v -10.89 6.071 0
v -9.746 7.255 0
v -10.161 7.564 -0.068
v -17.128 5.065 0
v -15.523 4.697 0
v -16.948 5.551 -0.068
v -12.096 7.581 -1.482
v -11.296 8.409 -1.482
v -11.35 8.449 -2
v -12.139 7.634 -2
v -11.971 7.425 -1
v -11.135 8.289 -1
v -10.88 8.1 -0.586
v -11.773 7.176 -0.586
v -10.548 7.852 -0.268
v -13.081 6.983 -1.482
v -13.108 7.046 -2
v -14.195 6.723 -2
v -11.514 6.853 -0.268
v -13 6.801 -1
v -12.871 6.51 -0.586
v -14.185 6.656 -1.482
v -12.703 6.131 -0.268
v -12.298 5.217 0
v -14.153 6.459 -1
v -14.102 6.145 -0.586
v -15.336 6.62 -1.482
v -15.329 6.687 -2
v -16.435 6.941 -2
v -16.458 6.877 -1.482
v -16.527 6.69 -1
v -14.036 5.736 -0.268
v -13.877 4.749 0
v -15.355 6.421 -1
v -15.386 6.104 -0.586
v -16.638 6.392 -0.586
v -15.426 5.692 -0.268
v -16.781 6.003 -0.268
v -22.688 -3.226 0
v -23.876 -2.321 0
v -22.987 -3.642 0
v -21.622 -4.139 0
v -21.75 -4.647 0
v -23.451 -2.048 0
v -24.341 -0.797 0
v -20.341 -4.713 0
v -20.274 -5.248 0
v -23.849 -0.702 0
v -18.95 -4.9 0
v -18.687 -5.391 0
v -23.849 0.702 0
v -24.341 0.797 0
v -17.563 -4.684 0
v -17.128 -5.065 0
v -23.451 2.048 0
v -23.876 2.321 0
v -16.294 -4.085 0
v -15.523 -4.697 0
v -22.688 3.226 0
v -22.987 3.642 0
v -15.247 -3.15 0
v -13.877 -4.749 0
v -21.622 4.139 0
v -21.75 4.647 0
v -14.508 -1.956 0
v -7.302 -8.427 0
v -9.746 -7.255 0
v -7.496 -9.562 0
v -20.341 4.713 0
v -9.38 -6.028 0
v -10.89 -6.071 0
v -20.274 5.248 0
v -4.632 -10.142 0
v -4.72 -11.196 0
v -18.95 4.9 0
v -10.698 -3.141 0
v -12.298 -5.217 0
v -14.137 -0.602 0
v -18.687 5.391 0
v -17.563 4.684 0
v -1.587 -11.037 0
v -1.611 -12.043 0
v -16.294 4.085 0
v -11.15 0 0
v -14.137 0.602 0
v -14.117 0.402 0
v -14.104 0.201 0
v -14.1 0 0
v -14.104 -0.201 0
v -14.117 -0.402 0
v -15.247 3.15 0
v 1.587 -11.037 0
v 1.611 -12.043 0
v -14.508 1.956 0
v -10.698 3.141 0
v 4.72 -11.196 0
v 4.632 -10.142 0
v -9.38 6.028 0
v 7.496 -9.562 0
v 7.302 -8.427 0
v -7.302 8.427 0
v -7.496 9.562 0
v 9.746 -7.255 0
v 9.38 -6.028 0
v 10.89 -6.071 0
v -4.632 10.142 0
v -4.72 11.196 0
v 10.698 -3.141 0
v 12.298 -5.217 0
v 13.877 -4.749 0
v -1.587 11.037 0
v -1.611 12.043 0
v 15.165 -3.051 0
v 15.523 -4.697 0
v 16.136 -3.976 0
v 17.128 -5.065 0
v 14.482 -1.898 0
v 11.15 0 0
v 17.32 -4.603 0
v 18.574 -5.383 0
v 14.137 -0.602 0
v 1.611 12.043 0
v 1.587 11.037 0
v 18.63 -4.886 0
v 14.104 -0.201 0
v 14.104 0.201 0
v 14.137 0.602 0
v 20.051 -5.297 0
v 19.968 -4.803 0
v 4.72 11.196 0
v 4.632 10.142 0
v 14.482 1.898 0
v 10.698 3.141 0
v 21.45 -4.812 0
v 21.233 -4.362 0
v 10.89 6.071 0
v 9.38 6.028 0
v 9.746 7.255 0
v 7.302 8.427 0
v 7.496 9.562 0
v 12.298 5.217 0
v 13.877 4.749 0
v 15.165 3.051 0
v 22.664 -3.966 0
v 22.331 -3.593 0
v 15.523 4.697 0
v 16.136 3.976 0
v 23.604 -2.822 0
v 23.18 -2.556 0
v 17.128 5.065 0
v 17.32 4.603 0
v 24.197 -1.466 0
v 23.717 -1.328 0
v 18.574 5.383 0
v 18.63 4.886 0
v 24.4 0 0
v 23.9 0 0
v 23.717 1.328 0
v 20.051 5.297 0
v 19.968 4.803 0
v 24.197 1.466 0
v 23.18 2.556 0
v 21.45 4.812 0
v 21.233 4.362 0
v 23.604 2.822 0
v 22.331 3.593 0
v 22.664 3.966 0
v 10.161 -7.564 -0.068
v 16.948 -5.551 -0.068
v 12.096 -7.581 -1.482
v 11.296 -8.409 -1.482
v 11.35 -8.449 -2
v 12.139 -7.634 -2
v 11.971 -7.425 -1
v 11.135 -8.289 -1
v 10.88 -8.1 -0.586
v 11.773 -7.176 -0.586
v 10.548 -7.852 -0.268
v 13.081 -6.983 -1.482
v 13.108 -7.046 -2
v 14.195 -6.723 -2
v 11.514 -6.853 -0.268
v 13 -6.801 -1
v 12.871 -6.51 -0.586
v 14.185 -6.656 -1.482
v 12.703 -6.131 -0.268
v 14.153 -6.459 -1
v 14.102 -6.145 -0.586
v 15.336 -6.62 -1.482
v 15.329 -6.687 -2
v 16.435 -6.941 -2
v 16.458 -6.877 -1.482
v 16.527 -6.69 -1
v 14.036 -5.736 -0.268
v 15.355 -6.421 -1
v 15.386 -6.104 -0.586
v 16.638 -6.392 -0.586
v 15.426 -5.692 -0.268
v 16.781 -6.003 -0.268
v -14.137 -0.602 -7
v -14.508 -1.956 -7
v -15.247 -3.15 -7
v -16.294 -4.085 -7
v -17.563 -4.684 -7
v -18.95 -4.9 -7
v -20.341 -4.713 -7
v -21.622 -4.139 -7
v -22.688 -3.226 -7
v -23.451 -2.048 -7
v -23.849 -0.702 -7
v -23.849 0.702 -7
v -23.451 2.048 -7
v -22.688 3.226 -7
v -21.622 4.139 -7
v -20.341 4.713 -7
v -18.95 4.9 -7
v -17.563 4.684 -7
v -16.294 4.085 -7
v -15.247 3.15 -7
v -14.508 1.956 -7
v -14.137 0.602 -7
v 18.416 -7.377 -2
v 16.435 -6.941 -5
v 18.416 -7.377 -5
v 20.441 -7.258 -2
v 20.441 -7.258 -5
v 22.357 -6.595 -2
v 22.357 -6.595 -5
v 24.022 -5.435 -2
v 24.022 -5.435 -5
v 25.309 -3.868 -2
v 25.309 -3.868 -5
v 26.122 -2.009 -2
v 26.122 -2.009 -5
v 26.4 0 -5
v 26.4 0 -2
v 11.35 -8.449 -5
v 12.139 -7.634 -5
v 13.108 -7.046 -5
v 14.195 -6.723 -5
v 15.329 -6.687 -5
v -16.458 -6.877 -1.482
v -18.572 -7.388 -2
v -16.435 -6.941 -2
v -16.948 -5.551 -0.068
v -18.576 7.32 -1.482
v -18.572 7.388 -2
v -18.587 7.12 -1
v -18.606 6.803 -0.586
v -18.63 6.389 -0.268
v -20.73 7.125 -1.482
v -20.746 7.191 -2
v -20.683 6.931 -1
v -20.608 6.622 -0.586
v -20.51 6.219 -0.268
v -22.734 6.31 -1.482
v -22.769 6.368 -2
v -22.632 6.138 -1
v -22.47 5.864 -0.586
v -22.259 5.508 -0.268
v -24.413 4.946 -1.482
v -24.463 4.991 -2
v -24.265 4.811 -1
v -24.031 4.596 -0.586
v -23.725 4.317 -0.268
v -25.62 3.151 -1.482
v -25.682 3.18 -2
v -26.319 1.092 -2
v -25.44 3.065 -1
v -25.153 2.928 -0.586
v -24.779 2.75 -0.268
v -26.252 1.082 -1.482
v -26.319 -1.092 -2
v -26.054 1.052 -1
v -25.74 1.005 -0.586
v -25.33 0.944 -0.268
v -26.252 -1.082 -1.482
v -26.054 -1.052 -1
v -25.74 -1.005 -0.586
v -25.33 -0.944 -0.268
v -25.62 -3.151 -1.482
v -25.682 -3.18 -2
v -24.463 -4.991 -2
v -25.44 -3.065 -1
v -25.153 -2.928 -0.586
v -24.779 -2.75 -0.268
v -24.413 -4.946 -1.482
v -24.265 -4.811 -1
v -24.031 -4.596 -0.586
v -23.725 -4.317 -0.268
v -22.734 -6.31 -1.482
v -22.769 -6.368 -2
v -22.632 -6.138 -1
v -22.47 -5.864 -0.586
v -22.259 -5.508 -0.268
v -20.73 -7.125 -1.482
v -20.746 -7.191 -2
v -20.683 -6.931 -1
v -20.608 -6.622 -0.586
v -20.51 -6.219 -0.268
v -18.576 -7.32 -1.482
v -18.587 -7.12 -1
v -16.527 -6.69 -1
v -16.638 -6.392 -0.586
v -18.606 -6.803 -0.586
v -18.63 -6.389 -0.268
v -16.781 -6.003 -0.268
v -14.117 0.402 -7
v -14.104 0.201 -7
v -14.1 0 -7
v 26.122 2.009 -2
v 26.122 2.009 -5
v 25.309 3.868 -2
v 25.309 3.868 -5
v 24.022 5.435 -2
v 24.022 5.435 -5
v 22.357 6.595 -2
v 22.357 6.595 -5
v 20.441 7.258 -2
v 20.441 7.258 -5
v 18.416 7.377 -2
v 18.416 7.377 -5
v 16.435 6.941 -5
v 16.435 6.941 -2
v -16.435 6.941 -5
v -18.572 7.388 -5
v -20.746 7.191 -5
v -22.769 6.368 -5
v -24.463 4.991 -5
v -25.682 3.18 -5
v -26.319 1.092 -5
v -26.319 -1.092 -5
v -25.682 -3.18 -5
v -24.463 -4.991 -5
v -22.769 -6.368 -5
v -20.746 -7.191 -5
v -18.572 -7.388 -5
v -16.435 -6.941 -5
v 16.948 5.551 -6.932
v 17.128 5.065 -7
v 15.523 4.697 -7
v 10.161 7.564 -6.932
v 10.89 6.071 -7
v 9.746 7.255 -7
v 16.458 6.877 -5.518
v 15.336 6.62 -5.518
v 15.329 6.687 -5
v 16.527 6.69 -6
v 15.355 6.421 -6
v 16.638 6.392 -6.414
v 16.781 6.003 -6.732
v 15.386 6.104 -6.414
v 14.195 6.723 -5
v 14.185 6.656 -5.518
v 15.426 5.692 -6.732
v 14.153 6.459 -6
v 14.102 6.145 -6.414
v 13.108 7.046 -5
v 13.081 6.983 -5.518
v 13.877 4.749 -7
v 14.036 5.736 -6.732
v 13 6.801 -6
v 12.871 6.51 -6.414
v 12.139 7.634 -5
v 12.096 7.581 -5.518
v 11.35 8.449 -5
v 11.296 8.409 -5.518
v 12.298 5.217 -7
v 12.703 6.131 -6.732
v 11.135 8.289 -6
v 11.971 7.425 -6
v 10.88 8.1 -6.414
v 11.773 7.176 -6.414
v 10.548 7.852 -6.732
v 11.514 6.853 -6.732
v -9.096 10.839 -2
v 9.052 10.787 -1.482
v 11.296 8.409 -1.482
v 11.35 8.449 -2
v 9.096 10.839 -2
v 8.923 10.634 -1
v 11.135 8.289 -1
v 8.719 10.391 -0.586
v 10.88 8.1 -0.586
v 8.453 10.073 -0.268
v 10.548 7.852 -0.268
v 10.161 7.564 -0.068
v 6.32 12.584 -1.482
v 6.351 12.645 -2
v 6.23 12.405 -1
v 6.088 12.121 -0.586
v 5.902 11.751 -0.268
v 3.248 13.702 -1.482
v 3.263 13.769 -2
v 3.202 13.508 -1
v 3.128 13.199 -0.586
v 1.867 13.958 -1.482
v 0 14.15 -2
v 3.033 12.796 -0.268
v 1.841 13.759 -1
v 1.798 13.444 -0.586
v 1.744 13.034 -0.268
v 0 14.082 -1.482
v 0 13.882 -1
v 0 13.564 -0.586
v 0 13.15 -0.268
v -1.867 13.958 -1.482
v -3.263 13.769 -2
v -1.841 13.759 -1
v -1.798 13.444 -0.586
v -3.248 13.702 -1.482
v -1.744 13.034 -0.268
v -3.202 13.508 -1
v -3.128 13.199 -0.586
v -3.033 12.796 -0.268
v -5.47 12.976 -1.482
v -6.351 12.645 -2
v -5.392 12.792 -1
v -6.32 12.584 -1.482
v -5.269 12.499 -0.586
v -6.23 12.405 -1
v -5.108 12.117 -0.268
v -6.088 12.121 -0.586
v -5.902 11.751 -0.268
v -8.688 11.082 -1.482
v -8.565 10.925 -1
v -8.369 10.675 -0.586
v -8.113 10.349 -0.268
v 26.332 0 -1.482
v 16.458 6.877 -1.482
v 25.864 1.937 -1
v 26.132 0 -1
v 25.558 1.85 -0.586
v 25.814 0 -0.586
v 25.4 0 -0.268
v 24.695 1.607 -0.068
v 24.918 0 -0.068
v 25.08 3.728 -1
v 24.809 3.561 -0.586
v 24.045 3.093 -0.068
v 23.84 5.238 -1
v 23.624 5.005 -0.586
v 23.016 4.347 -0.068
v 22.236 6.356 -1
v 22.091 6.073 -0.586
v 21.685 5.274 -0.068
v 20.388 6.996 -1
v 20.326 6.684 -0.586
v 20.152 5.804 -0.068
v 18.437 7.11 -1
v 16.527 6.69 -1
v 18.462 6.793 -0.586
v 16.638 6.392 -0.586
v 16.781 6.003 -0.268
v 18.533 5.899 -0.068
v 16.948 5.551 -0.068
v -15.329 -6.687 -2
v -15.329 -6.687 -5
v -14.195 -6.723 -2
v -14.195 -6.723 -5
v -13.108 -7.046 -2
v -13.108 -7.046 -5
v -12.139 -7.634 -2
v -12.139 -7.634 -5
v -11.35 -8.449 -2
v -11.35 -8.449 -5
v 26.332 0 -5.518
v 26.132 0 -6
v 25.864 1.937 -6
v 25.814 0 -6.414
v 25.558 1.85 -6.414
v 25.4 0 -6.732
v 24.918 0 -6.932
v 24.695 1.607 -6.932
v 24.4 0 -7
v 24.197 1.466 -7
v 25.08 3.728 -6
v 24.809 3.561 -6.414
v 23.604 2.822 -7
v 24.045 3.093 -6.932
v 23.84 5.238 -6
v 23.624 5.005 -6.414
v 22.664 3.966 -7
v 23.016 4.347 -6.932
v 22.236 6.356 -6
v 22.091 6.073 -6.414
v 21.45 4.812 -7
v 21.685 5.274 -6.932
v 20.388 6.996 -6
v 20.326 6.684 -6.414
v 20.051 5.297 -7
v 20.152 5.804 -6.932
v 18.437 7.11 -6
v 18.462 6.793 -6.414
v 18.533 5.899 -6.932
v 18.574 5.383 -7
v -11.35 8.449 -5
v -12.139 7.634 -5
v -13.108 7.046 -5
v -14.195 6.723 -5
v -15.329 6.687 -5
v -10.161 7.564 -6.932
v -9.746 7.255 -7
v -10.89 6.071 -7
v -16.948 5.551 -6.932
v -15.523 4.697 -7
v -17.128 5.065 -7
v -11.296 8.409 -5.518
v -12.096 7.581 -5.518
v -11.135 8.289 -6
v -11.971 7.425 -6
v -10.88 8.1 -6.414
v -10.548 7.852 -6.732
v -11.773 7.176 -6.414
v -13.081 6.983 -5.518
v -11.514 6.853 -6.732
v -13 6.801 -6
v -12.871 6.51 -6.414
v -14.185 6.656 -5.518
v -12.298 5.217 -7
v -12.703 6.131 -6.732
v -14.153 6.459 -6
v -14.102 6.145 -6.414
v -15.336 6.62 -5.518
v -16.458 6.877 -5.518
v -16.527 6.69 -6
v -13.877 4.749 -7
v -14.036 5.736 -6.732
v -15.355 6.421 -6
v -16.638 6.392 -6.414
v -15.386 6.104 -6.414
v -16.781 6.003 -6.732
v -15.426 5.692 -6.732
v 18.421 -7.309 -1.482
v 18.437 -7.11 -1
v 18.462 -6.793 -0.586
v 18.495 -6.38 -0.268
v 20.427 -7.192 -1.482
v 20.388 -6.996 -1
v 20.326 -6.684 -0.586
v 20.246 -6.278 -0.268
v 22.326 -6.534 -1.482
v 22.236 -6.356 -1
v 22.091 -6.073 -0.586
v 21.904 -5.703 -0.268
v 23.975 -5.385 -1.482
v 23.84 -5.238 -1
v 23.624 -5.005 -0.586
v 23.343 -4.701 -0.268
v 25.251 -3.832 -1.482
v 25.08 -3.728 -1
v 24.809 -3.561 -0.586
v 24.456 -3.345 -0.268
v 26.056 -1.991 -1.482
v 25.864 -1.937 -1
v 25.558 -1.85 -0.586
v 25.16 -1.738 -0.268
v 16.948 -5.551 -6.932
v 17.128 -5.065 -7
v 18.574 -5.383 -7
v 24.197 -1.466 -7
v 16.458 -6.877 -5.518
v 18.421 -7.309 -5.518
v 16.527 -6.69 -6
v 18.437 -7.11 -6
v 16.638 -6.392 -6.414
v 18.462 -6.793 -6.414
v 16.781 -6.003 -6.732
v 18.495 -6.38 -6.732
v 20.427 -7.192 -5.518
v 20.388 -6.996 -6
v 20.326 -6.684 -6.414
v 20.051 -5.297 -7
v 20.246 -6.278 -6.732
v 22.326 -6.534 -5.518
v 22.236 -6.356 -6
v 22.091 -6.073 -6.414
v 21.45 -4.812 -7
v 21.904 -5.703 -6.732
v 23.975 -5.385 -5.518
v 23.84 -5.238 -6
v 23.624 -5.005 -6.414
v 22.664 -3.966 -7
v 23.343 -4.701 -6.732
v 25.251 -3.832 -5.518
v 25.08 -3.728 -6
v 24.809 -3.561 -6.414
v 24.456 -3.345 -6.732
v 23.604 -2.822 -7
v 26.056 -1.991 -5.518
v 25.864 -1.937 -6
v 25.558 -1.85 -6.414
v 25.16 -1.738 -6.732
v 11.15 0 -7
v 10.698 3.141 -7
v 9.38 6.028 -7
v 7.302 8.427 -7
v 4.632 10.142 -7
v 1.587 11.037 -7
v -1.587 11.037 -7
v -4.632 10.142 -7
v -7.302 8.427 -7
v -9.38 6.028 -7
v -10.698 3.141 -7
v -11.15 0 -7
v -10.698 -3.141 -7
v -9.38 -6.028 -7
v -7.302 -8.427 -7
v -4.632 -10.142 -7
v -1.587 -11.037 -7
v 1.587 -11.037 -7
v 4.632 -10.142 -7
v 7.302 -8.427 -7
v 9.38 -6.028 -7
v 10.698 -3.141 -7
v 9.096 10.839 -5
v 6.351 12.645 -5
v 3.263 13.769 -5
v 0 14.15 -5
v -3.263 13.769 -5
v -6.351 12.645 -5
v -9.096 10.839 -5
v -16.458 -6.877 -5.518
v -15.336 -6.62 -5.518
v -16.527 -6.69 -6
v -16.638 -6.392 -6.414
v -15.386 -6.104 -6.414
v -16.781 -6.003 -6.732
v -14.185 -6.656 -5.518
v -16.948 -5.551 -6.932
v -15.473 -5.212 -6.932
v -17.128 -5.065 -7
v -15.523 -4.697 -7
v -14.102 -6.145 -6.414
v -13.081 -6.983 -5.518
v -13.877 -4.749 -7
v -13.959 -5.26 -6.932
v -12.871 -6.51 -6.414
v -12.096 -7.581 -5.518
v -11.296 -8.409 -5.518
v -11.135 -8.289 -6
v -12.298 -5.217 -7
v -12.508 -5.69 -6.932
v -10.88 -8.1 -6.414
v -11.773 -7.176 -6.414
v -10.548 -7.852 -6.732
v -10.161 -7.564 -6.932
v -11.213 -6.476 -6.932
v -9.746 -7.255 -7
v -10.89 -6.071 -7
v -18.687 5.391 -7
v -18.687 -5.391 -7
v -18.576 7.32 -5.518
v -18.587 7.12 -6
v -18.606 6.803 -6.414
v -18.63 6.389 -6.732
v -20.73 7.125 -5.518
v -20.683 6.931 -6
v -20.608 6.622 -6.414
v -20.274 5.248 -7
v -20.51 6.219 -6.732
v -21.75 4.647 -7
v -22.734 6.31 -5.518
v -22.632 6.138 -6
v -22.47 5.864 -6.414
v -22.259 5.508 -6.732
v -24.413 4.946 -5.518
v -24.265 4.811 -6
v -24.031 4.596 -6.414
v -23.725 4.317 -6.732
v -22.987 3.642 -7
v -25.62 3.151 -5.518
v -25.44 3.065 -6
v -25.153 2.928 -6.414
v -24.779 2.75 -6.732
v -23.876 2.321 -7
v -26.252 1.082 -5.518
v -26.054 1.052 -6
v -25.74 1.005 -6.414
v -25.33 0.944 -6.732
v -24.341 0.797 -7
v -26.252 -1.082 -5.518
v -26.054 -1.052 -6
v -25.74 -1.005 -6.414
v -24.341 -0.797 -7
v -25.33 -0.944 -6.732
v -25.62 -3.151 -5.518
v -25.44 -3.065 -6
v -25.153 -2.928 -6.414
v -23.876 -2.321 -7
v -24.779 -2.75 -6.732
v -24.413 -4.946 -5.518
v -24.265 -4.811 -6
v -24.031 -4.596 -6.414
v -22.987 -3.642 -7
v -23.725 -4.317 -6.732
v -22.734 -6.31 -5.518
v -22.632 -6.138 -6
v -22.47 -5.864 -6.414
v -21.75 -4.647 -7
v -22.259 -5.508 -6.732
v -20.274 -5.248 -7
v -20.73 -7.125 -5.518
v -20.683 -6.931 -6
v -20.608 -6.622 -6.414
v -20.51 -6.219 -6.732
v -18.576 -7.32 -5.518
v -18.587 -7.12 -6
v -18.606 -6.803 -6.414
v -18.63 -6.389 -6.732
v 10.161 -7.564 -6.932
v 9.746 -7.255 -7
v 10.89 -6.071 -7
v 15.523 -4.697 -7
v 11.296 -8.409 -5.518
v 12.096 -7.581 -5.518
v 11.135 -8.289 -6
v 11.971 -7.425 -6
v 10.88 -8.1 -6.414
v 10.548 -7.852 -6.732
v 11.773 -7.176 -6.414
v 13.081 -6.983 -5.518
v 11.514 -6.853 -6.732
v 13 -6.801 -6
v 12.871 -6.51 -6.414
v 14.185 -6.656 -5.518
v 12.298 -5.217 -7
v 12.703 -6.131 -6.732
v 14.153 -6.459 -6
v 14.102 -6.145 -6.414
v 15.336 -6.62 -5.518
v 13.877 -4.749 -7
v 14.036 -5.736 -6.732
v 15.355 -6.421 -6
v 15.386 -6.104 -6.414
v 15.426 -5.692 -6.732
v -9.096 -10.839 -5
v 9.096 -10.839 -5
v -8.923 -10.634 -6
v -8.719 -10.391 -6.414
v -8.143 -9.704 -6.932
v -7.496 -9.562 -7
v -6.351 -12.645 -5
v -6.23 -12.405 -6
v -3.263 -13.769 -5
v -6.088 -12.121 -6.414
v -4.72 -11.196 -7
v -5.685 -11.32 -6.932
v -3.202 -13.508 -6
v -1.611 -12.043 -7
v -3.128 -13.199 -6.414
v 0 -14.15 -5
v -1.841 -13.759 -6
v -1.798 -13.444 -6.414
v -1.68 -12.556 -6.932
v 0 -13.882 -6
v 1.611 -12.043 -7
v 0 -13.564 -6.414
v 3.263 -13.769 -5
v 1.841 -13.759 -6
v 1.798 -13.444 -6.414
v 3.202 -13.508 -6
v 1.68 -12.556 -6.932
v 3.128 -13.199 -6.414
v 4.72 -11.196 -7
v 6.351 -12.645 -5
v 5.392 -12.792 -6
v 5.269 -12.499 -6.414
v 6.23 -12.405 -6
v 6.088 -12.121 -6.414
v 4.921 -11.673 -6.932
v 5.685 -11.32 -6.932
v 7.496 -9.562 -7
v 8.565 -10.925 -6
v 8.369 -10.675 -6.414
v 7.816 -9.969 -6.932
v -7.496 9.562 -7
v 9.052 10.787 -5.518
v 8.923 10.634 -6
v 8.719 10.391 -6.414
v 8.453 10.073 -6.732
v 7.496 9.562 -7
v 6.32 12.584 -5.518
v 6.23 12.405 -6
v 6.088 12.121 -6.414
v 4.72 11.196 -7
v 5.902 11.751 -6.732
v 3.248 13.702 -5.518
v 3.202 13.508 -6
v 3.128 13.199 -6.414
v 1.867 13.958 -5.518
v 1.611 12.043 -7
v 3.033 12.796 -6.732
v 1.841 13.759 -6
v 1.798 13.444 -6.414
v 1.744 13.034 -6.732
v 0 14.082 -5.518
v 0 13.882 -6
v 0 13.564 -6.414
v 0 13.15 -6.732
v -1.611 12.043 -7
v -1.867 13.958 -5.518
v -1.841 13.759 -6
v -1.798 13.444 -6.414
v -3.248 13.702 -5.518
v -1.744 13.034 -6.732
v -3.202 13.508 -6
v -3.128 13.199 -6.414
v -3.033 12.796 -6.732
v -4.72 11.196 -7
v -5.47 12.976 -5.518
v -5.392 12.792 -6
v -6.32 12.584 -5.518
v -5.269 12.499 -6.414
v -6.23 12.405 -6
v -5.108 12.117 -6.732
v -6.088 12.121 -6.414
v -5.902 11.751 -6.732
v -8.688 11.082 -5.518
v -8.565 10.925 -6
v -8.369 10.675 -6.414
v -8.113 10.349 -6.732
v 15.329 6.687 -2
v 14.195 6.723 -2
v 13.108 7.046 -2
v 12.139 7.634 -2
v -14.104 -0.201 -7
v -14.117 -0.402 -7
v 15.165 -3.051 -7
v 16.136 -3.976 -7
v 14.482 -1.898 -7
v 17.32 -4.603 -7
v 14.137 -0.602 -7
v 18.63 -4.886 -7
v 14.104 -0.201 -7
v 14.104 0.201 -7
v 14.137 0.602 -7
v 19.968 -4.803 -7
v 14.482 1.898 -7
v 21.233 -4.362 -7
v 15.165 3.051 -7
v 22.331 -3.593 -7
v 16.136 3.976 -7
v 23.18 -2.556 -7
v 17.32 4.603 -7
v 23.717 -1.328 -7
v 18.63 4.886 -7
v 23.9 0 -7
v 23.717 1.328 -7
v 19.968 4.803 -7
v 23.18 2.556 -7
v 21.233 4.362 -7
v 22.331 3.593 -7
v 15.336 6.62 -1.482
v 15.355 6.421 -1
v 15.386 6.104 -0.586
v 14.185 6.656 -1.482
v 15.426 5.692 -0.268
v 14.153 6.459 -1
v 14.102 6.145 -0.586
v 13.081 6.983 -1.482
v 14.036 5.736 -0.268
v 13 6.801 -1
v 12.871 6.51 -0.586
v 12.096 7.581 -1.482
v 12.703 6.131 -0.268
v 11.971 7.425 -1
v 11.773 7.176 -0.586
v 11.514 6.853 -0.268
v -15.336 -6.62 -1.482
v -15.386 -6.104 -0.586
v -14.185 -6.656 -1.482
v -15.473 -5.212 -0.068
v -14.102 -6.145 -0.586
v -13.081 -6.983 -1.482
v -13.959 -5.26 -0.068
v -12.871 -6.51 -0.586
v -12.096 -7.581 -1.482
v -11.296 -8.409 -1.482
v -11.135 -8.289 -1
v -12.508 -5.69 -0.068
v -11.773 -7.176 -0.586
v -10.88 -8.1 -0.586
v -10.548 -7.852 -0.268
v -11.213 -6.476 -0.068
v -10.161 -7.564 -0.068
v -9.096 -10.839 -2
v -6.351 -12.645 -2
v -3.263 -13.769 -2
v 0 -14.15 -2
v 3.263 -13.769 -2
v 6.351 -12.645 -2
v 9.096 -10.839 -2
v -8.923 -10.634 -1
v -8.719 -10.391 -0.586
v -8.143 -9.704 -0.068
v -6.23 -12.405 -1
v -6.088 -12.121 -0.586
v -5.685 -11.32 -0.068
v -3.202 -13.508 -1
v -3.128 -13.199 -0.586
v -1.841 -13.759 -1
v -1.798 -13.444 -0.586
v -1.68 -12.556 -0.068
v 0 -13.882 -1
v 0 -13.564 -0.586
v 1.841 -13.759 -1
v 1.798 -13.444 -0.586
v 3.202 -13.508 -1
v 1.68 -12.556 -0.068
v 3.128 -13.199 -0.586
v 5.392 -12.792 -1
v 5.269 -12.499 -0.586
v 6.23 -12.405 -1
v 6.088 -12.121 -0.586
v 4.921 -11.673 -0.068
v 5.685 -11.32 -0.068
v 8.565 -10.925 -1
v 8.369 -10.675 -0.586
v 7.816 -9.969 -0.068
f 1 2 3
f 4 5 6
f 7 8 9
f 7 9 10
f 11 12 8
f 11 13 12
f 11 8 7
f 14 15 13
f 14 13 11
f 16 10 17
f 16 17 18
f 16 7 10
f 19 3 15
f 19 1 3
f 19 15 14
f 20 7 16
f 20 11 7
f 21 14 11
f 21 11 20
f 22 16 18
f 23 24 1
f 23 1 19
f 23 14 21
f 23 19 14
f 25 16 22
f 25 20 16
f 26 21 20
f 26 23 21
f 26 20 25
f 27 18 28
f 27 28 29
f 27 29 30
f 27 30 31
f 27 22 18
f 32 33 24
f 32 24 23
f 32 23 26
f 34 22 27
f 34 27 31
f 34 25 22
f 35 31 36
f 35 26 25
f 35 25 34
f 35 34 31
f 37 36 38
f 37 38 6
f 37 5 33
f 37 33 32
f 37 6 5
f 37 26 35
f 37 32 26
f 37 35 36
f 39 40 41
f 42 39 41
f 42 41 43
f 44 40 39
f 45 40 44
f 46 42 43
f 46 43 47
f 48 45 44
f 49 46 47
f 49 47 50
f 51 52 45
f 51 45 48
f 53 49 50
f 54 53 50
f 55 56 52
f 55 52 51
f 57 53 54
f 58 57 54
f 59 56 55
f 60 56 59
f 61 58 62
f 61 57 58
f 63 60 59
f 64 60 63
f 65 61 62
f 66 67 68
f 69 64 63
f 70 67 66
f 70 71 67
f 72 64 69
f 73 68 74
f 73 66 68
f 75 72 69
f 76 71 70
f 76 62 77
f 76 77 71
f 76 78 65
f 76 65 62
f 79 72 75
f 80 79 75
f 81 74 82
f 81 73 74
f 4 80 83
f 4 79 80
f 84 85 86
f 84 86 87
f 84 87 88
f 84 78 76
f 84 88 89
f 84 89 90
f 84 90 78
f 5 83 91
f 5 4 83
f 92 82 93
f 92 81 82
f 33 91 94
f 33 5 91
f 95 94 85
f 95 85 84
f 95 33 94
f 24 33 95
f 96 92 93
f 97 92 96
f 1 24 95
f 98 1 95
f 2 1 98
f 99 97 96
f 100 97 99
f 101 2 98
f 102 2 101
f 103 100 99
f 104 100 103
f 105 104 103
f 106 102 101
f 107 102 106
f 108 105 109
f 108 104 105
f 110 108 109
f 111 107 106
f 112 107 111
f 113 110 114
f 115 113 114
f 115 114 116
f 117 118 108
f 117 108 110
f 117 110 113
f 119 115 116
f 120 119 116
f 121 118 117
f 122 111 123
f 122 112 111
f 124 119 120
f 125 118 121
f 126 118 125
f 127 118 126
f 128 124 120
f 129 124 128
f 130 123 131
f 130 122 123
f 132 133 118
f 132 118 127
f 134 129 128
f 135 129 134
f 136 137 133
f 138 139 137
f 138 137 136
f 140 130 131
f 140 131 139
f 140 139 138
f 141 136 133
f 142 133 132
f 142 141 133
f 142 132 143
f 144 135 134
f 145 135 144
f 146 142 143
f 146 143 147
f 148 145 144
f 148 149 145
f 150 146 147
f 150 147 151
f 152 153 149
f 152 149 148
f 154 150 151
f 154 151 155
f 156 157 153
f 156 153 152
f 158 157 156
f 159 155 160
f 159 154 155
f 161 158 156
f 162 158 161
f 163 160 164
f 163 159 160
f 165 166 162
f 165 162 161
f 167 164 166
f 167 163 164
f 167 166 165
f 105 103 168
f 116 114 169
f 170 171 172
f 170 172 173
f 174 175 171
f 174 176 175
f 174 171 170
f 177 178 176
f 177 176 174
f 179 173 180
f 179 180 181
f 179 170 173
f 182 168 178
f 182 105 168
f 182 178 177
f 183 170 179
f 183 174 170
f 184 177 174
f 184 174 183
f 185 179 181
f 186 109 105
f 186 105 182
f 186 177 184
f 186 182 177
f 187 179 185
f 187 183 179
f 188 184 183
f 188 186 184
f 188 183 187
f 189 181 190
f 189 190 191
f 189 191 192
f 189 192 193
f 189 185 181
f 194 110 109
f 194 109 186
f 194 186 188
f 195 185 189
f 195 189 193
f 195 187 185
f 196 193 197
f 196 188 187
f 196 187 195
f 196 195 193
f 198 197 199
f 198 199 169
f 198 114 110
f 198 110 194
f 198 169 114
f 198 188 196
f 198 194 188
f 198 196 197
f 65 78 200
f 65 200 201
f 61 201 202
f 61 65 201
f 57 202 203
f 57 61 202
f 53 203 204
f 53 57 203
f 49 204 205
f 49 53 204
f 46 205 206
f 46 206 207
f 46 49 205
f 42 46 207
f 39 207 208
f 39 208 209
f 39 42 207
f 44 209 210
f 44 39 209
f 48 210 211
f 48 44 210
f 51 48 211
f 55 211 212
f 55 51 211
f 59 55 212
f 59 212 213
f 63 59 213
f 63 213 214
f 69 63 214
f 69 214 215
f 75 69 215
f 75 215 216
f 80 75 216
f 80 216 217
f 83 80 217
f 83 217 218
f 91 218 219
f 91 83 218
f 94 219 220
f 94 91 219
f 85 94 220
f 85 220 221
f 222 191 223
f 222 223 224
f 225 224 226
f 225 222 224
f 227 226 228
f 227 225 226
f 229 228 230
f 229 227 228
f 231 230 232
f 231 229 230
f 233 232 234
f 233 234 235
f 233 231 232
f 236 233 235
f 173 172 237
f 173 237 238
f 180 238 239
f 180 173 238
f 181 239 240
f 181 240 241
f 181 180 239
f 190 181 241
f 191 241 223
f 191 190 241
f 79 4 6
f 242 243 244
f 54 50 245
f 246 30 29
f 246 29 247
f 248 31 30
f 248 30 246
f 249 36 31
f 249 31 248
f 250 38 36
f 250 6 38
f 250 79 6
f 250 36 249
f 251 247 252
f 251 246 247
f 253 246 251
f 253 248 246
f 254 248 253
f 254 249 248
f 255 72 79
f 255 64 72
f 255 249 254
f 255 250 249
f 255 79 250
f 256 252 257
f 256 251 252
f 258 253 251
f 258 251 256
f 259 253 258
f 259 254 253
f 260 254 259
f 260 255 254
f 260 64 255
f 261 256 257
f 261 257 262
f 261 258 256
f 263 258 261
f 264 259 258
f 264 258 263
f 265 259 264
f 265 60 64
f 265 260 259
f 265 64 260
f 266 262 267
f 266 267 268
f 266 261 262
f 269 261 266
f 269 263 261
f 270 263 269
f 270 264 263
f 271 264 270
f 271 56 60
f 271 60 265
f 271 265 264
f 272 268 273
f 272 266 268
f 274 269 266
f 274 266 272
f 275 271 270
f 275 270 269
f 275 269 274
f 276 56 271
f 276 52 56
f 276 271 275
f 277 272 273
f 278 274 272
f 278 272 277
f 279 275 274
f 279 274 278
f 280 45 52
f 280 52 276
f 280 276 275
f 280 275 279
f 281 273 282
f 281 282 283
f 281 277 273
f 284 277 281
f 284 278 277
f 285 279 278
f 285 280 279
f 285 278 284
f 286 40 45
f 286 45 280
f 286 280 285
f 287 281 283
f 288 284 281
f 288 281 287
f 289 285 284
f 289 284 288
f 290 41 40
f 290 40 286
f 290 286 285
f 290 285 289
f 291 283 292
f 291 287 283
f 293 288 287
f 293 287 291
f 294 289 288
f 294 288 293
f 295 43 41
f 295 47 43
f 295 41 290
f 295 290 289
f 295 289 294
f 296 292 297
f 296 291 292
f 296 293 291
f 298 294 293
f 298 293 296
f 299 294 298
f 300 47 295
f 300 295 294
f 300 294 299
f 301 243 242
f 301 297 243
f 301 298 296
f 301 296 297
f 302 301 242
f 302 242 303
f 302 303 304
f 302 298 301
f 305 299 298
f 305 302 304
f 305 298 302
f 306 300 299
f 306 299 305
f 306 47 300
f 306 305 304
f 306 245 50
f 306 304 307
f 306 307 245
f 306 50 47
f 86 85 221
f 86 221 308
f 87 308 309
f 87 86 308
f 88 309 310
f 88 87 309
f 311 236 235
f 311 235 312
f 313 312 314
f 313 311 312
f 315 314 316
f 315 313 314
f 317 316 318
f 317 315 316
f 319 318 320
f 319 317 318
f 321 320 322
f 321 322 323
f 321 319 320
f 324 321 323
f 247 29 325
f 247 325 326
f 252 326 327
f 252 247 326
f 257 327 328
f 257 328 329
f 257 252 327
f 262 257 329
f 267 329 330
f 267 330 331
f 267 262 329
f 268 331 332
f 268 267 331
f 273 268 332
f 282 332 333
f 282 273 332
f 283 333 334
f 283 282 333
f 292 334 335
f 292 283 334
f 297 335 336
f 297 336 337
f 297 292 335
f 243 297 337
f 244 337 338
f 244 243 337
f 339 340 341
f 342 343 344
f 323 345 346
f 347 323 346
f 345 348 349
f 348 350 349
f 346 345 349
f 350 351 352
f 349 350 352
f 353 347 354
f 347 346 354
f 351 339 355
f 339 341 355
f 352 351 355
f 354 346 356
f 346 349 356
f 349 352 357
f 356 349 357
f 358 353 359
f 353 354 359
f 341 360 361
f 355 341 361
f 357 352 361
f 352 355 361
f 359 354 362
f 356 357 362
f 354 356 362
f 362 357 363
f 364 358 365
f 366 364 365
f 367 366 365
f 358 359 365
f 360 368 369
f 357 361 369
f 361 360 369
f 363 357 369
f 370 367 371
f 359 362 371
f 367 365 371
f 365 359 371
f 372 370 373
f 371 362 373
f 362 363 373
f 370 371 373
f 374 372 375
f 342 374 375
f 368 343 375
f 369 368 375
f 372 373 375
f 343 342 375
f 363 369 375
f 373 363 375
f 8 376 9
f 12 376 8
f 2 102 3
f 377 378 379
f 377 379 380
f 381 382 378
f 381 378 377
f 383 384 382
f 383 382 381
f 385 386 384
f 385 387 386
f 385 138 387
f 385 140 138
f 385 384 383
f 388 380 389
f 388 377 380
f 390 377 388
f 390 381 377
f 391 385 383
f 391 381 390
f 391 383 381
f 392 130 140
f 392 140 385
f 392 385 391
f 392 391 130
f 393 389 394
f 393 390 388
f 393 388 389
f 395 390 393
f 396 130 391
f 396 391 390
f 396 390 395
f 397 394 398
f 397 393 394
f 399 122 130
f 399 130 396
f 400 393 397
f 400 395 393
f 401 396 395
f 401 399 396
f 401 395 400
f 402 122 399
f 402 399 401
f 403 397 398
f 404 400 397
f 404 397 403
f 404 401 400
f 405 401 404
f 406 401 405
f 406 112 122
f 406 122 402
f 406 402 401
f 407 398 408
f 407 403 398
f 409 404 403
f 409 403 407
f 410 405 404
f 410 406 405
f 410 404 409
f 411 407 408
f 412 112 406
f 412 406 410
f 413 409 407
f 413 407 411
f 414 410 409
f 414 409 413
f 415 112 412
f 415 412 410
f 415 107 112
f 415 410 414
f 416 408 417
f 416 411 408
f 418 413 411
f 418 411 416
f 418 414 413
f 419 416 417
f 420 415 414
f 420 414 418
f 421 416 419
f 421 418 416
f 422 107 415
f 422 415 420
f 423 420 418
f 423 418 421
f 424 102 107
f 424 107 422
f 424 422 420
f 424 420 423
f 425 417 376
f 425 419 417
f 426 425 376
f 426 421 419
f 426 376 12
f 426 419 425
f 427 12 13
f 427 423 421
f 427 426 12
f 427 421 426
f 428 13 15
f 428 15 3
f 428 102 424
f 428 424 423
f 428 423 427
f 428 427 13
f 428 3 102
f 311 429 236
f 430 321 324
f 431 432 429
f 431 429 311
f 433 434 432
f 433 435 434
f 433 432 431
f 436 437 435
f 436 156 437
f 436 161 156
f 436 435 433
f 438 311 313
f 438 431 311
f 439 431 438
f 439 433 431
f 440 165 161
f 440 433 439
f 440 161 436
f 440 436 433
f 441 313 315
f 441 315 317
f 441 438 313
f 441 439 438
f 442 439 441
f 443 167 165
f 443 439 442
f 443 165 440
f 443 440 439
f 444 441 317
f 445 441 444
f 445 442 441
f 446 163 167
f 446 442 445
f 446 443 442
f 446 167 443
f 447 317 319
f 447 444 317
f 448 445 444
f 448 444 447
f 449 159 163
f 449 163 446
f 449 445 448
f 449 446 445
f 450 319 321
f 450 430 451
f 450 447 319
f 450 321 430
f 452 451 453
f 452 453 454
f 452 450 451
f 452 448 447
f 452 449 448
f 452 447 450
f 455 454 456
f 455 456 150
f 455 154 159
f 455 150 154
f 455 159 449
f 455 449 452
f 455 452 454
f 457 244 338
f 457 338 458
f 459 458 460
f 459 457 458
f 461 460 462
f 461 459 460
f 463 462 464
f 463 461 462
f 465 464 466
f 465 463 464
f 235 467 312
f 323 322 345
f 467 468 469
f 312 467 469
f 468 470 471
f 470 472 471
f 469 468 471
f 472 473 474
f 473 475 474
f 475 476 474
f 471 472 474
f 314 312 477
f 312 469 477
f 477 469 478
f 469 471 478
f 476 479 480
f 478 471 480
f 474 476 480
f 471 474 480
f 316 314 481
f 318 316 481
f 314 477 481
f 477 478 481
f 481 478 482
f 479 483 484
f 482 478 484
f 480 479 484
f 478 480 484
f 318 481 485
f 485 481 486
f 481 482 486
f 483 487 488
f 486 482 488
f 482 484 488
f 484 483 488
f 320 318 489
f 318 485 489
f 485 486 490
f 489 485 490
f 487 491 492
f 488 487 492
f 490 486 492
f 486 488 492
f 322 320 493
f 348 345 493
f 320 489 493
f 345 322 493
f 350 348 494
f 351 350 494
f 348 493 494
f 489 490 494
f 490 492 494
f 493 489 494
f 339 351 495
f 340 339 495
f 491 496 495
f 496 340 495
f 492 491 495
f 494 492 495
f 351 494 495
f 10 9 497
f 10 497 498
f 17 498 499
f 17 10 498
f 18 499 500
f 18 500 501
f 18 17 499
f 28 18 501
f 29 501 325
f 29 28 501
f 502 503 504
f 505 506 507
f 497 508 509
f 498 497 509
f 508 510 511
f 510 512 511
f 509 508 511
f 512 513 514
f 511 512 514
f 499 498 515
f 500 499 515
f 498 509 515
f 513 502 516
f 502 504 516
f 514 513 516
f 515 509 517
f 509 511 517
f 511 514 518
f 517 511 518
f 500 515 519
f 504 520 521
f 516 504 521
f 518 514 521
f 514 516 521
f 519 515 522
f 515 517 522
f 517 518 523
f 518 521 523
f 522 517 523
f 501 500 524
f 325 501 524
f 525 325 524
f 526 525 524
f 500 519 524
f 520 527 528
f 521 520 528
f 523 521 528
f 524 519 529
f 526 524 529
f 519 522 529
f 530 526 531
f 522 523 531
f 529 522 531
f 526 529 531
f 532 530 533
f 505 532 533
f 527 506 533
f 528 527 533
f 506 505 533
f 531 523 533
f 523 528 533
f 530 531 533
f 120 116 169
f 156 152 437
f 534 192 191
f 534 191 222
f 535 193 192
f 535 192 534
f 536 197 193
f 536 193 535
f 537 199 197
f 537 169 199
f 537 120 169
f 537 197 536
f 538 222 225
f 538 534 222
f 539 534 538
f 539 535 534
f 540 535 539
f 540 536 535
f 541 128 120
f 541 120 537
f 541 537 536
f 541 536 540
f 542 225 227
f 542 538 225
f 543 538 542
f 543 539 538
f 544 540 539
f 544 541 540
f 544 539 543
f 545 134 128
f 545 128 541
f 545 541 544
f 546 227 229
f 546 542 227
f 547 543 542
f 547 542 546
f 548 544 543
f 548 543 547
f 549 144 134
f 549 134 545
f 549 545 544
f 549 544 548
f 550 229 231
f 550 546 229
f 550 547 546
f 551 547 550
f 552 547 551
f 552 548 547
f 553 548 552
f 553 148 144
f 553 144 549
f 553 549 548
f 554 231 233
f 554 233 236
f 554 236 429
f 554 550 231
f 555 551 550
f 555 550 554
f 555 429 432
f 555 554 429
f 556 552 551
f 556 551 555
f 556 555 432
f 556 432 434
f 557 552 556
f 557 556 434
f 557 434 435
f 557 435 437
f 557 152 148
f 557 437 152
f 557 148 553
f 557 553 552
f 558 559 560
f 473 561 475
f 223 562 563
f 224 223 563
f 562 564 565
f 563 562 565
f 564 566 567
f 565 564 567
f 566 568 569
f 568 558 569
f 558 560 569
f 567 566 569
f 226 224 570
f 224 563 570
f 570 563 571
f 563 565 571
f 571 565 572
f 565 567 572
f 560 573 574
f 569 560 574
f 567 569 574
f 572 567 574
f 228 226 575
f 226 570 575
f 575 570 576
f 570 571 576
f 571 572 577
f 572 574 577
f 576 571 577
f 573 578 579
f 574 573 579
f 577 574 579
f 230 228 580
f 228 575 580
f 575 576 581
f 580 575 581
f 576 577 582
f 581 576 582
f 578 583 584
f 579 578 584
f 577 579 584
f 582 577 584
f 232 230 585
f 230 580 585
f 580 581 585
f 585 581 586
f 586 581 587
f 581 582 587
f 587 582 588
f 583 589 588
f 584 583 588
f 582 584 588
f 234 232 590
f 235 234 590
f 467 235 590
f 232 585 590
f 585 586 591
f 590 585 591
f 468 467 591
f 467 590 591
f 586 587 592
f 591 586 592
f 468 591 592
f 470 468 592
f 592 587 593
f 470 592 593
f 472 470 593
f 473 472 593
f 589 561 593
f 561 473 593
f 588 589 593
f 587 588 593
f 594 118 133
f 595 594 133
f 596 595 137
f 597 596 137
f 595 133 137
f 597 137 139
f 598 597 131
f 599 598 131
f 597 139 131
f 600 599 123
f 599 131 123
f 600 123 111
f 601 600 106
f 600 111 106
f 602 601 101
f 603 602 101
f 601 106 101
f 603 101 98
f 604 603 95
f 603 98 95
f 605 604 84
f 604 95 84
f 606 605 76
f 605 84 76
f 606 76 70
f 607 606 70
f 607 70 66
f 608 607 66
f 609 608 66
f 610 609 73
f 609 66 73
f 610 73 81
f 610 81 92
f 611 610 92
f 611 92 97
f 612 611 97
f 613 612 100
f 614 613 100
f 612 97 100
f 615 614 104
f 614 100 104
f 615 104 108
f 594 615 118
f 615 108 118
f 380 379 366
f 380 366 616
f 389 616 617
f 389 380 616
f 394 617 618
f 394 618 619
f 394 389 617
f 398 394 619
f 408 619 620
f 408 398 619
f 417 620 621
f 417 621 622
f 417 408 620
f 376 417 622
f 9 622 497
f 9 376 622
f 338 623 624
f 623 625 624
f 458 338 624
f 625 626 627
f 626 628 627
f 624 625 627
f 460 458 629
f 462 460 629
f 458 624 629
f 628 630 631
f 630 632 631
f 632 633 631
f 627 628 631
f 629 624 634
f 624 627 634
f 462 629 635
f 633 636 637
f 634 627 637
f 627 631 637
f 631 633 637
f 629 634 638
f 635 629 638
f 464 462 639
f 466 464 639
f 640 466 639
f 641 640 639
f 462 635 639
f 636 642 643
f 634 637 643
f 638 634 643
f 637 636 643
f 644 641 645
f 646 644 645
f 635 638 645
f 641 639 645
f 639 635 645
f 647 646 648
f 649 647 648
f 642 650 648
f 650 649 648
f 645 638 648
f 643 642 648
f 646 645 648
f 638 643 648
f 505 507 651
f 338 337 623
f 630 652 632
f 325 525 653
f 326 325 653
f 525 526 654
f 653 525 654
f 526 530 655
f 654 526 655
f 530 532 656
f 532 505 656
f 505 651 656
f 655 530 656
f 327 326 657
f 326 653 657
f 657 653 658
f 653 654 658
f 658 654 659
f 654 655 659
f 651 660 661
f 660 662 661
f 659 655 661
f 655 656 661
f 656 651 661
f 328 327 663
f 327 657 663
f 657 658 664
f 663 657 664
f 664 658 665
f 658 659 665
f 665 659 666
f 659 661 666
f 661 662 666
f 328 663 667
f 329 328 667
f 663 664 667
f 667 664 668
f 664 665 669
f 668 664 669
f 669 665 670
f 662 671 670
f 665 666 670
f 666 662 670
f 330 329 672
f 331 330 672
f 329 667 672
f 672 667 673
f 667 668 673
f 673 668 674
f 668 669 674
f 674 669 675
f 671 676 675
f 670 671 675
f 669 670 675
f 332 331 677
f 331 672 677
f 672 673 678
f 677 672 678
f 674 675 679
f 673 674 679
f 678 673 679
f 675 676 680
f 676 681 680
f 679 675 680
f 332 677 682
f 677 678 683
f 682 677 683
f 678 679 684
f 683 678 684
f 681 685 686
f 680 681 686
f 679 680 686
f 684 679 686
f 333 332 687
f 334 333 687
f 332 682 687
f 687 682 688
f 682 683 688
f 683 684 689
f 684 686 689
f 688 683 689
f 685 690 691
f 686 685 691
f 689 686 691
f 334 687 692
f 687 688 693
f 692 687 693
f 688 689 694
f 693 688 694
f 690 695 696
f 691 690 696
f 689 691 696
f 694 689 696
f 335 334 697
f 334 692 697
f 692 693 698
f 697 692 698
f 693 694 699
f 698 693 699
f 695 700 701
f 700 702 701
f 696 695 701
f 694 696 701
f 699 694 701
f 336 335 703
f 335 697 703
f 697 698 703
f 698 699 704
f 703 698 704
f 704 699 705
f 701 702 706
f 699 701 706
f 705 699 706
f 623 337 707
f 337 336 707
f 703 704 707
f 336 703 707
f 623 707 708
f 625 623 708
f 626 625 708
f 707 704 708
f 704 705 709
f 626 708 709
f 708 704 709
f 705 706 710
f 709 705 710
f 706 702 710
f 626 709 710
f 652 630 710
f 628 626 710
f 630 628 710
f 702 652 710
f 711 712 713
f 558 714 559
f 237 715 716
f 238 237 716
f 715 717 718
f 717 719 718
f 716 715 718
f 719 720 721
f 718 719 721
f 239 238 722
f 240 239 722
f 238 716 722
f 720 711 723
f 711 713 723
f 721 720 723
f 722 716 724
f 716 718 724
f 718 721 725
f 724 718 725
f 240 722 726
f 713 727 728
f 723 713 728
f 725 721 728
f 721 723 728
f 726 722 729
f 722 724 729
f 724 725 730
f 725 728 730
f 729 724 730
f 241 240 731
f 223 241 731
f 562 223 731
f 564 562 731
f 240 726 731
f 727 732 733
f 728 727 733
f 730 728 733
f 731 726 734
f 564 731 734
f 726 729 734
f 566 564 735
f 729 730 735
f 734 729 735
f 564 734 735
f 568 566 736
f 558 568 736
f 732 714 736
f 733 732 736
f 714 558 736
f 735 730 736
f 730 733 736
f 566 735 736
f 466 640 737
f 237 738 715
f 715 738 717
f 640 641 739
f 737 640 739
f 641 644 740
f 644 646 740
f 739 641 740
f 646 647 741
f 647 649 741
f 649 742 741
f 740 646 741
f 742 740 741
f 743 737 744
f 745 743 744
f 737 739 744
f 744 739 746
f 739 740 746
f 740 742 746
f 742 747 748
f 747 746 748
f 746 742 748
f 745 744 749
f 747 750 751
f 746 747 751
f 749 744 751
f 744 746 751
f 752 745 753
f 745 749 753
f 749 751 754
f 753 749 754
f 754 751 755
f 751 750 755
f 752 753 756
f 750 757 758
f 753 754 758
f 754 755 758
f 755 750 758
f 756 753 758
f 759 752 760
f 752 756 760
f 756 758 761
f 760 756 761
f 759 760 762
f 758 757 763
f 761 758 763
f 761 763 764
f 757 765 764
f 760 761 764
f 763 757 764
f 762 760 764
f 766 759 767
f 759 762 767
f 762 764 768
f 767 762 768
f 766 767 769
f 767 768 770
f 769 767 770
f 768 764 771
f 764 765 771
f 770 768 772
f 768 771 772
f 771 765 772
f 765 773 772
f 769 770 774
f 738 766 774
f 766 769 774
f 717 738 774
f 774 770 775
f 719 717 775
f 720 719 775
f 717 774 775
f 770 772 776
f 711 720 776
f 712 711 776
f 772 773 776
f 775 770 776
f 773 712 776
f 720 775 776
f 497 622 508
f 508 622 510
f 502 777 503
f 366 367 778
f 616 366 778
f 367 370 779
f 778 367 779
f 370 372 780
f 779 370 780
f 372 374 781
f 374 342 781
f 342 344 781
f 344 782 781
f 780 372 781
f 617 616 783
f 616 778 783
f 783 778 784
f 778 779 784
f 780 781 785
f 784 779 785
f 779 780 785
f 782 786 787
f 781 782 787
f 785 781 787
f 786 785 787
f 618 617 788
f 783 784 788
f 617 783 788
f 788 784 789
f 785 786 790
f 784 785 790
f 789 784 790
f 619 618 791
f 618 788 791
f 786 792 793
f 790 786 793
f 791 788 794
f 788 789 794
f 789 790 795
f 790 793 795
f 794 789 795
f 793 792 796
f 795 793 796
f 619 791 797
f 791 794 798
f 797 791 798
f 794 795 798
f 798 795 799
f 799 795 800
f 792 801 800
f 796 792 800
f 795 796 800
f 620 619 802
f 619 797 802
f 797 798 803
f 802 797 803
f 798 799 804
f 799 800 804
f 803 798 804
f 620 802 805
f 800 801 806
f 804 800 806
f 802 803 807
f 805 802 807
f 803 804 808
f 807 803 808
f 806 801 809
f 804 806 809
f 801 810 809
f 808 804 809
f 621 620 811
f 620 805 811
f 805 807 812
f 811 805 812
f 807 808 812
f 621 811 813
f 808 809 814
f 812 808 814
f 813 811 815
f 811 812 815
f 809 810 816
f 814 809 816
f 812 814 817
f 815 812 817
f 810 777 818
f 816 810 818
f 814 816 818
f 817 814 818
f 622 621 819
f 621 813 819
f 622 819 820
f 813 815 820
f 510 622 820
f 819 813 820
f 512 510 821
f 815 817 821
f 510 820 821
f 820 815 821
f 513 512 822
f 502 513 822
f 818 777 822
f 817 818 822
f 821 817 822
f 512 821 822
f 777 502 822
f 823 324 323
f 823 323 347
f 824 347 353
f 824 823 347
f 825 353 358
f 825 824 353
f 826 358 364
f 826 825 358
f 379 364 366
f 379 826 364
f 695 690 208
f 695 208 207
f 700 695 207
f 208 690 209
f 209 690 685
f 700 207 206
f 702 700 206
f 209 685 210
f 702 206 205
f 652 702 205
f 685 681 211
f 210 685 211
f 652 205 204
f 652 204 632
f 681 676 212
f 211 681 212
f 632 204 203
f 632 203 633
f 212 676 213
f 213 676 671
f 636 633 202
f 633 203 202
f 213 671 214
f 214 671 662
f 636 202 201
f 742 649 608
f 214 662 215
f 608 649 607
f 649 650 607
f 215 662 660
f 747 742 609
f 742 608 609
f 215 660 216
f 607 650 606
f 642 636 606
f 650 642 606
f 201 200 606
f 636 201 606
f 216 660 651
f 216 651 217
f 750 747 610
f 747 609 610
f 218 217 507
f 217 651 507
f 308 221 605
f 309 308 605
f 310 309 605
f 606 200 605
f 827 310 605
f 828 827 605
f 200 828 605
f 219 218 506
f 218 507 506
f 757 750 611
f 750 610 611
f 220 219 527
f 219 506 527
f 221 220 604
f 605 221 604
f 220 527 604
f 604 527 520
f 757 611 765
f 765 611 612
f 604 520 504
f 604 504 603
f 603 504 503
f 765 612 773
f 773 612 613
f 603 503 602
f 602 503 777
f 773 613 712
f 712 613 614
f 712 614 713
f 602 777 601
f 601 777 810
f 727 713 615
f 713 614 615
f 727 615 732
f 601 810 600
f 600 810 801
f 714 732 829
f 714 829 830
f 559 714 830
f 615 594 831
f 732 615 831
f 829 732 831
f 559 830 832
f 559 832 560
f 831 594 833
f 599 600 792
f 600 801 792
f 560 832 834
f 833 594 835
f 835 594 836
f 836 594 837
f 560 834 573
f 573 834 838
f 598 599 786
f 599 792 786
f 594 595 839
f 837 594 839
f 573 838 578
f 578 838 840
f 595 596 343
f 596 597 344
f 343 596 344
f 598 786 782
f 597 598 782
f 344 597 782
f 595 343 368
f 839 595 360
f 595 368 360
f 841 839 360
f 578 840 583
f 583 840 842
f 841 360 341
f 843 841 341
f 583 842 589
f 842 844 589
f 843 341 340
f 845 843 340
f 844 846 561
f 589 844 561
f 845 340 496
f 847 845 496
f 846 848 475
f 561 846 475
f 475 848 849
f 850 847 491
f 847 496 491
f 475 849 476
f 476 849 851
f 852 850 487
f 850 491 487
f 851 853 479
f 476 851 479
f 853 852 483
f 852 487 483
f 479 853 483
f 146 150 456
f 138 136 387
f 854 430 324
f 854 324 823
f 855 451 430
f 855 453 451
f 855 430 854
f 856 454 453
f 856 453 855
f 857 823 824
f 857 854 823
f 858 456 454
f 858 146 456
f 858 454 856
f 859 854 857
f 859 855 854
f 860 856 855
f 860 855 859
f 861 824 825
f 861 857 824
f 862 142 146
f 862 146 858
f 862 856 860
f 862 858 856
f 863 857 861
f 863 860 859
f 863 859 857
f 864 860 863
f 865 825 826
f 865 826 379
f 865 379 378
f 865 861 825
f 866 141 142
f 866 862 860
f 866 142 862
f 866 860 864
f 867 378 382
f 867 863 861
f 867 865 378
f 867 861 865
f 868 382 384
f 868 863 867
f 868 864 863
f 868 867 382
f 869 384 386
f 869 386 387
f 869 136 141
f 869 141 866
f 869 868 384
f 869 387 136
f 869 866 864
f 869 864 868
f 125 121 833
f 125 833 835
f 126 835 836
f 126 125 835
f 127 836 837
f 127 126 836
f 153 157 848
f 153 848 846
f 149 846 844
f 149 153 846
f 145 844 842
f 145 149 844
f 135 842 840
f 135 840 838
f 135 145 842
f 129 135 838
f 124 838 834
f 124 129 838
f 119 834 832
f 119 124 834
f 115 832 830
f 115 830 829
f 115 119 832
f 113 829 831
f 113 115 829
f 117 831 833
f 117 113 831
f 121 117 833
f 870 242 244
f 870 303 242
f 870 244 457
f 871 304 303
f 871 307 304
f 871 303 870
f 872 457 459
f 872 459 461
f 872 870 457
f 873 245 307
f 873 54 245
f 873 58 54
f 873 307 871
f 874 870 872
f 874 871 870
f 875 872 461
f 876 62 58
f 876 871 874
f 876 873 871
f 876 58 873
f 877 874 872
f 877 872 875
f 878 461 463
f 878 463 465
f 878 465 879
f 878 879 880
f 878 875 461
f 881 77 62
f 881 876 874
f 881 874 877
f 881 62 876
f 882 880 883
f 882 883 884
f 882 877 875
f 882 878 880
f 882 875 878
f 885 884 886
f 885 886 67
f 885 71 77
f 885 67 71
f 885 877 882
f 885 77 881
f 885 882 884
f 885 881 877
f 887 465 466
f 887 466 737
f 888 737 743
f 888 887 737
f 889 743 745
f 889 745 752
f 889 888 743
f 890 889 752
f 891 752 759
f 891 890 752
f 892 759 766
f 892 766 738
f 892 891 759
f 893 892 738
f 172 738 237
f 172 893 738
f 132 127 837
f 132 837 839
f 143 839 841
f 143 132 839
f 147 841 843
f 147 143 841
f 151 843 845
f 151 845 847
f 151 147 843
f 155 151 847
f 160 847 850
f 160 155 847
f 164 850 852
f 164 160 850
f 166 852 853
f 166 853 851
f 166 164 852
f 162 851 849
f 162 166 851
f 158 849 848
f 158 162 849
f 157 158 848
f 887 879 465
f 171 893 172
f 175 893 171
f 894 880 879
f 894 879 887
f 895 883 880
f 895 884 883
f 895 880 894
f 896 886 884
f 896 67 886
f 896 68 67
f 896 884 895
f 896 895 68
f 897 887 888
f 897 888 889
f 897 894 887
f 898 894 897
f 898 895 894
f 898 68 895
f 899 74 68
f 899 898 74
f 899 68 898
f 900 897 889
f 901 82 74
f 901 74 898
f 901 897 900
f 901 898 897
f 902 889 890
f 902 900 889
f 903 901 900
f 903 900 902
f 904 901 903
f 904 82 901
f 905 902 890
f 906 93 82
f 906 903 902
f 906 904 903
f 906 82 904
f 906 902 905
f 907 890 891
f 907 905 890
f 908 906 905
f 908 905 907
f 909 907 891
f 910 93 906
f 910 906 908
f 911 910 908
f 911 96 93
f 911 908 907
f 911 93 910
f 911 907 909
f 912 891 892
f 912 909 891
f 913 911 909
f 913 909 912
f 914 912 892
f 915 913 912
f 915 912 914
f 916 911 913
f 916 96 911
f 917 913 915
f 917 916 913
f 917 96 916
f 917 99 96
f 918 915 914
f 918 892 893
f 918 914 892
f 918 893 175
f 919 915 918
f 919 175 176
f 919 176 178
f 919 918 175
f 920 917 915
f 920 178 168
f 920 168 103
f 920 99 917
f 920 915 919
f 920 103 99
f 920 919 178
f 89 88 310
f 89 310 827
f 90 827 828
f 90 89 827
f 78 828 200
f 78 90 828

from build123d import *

# Parameters (mm, degrees)
F0_R     = 11.15
F1_DEPTH = 7
F2_R     = 2


# Not quite as in the source:
# - a feature names something its author has since deleted; it is built from what else it names


with BuildPart() as f1:
    # F0 (on Top) → F1 (new body)
    with BuildSketch(Plane.XY):
        with BuildLine():
            ThreePointArc((14.1371710526, 0.602407361), (13.8884683868, 2.7079412603), (13.3279605263, 4.752680108))
            ThreePointArc((13.3279605263, 4.752680108), (11.6, 0), (13.3279605263, -4.752680108))
            ThreePointArc((13.3279605263, -4.752680108), (13.8884683868, -2.7079412603), (14.1371710526, -0.602407361))
            ThreePointArc((14.1371710526, -0.602407361), (14.1, 0), (14.1371710526, 0.602407361))
        make_face()
        with BuildLine():
            ThreePointArc((16.434506619, 6.9410549423), (14.738370853, 6.0496708186), (13.3279605263, 4.752680108))
            ThreePointArc((13.3279605263, 4.752680108), (13.8884683868, 2.7079412603), (14.1371710526, 0.602407361))
            ThreePointArc((14.1371710526, 0.602407361), (19.3017765381, 4.8906984083), (23.9, 0))
            ThreePointArc((23.9, 0), (19.3017765381, -4.8906984083), (14.1371710526, -0.602407361))
            ThreePointArc((14.1371710526, -0.602407361), (13.8884683868, -2.7079412603), (13.3279605263, -4.752680108))
            ThreePointArc((13.3279605263, -4.752680108), (14.738370853, -6.0496708186), (16.434506619, -6.9410549423))
            ThreePointArc((16.434506619, -6.9410549423), (23.2293822824, -6.0722586827), (26.4, 0))
            ThreePointArc((26.4, 0), (23.2293822824, 6.0722586827), (16.434506619, 6.9410549423))
        make_face()
        with BuildLine():
            ThreePointArc((13.3279605263, 4.752680108), (12.4767937703, 6.6747372393), (11.3502717852, 8.4494869905))
            ThreePointArc((11.3502717852, 8.4494869905), (0, 14.15), (-11.3502717852, 8.4494869905))
            ThreePointArc((-11.3502717852, 8.4494869905), (-12.4767937703, 6.6747372393), (-13.3279605263, 4.752680108))
            ThreePointArc((-13.3279605263, 4.752680108), (-12.0453938967, 2.5285280199), (-11.6, 0))
            ThreePointArc((-11.6, 0), (-12.0453938967, -2.5285280199), (-13.3279605263, -4.752680108))
            ThreePointArc((-13.3279605263, -4.752680108), (-12.4767937703, -6.6747372393), (-11.3502717852, -8.4494869905))
            ThreePointArc((-11.3502717852, -8.4494869905), (0, -14.15), (11.3502717852, -8.4494869905))
            ThreePointArc((11.3502717852, -8.4494869905), (12.4767937703, -6.6747372393), (13.3279605263, -4.752680108))
            ThreePointArc((13.3279605263, -4.752680108), (11.6, 0), (13.3279605263, 4.752680108))
        make_face()
        Circle(F0_R, mode=Mode.SUBTRACT)
        with BuildLine():
            ThreePointArc((-11.6, 0), (-12.0453938967, 2.5285280199), (-13.3279605263, 4.752680108))
            ThreePointArc((-13.3279605263, 4.752680108), (-13.8884683868, 2.7079412603), (-14.1371710526, 0.602407361))
            ThreePointArc((-14.1371710526, 0.602407361), (-14.1093015917, 0.3017765381), (-14.1, 0))
            ThreePointArc((-14.1, 0), (-14.1093015917, -0.3017765381), (-14.1371710526, -0.602407361))
            ThreePointArc((-14.1371710526, -0.602407361), (-13.8884683868, -2.7079412603), (-13.3279605263, -4.752680108))
            ThreePointArc((-13.3279605263, -4.752680108), (-12.0453938967, -2.5285280199), (-11.6, 0))
        make_face()
        with BuildLine():
            ThreePointArc((-14.1371710526, 0.602407361), (-13.8884683868, 2.7079412603), (-13.3279605263, 4.752680108))
            ThreePointArc((-13.3279605263, 4.752680108), (-14.738370853, 6.0496708186), (-16.434506619, 6.9410549423))
            ThreePointArc((-16.434506619, 6.9410549423), (-26.4, 0), (-16.434506619, -6.9410549423))
            ThreePointArc((-16.434506619, -6.9410549423), (-14.738370853, -6.0496708186), (-13.3279605263, -4.752680108))
            ThreePointArc((-13.3279605263, -4.752680108), (-13.8884683868, -2.7079412603), (-14.1371710526, -0.602407361))
            ThreePointArc((-14.1371710526, -0.602407361), (-23.9, 0), (-14.1371710526, 0.602407361))
        make_face()
        with BuildLine():
            ThreePointArc((16.434506619, -6.9410549423), (14.738370853, -6.0496708186), (13.3279605263, -4.752680108))
            ThreePointArc((13.3279605263, -4.752680108), (12.4767937703, -6.6747372393), (11.3502717852, -8.4494869905))
            ThreePointArc((11.3502717852, -8.4494869905), (13.6414226502, -6.8493774528), (16.434506619, -6.9410549423))
        make_face()
        with BuildLine():
            ThreePointArc((16.434506619, 6.9410549423), (13.6414226502, 6.8493774528), (11.3502717852, 8.4494869905))
            ThreePointArc((11.3502717852, 8.4494869905), (12.4767937703, 6.6747372393), (13.3279605263, 4.752680108))
            ThreePointArc((13.3279605263, 4.752680108), (14.738370853, 6.0496708186), (16.434506619, 6.9410549423))
        make_face()
        with BuildLine():
            ThreePointArc((-13.3279605263, -4.752680108), (-14.738370853, -6.0496708186), (-16.434506619, -6.9410549423))
            ThreePointArc((-16.434506619, -6.9410549423), (-13.6414226502, -6.8493774528), (-11.3502717852, -8.4494869905))
            ThreePointArc((-11.3502717852, -8.4494869905), (-12.4767937703, -6.6747372393), (-13.3279605263, -4.752680108))
        make_face()
        with BuildLine():
            ThreePointArc((-13.3279605263, 4.752680108), (-12.4767937703, 6.6747372393), (-11.3502717852, 8.4494869905))
            ThreePointArc((-11.3502717852, 8.4494869905), (-13.6414226502, 6.8493774528), (-16.434506619, 6.9410549423))
            ThreePointArc((-16.434506619, 6.9410549423), (-14.738370853, 6.0496708186), (-13.3279605263, 4.752680108))
        make_face()
    extrude(amount=-F1_DEPTH)

    # F2
    f2_edges = [f1.edges().sort_by_distance(p)[0] for p in [
        (0, -14.15, 0),
        (0, -14.15, -7),
    ]]
    fillet(f2_edges, radius=F2_R)


solid = f1.part
